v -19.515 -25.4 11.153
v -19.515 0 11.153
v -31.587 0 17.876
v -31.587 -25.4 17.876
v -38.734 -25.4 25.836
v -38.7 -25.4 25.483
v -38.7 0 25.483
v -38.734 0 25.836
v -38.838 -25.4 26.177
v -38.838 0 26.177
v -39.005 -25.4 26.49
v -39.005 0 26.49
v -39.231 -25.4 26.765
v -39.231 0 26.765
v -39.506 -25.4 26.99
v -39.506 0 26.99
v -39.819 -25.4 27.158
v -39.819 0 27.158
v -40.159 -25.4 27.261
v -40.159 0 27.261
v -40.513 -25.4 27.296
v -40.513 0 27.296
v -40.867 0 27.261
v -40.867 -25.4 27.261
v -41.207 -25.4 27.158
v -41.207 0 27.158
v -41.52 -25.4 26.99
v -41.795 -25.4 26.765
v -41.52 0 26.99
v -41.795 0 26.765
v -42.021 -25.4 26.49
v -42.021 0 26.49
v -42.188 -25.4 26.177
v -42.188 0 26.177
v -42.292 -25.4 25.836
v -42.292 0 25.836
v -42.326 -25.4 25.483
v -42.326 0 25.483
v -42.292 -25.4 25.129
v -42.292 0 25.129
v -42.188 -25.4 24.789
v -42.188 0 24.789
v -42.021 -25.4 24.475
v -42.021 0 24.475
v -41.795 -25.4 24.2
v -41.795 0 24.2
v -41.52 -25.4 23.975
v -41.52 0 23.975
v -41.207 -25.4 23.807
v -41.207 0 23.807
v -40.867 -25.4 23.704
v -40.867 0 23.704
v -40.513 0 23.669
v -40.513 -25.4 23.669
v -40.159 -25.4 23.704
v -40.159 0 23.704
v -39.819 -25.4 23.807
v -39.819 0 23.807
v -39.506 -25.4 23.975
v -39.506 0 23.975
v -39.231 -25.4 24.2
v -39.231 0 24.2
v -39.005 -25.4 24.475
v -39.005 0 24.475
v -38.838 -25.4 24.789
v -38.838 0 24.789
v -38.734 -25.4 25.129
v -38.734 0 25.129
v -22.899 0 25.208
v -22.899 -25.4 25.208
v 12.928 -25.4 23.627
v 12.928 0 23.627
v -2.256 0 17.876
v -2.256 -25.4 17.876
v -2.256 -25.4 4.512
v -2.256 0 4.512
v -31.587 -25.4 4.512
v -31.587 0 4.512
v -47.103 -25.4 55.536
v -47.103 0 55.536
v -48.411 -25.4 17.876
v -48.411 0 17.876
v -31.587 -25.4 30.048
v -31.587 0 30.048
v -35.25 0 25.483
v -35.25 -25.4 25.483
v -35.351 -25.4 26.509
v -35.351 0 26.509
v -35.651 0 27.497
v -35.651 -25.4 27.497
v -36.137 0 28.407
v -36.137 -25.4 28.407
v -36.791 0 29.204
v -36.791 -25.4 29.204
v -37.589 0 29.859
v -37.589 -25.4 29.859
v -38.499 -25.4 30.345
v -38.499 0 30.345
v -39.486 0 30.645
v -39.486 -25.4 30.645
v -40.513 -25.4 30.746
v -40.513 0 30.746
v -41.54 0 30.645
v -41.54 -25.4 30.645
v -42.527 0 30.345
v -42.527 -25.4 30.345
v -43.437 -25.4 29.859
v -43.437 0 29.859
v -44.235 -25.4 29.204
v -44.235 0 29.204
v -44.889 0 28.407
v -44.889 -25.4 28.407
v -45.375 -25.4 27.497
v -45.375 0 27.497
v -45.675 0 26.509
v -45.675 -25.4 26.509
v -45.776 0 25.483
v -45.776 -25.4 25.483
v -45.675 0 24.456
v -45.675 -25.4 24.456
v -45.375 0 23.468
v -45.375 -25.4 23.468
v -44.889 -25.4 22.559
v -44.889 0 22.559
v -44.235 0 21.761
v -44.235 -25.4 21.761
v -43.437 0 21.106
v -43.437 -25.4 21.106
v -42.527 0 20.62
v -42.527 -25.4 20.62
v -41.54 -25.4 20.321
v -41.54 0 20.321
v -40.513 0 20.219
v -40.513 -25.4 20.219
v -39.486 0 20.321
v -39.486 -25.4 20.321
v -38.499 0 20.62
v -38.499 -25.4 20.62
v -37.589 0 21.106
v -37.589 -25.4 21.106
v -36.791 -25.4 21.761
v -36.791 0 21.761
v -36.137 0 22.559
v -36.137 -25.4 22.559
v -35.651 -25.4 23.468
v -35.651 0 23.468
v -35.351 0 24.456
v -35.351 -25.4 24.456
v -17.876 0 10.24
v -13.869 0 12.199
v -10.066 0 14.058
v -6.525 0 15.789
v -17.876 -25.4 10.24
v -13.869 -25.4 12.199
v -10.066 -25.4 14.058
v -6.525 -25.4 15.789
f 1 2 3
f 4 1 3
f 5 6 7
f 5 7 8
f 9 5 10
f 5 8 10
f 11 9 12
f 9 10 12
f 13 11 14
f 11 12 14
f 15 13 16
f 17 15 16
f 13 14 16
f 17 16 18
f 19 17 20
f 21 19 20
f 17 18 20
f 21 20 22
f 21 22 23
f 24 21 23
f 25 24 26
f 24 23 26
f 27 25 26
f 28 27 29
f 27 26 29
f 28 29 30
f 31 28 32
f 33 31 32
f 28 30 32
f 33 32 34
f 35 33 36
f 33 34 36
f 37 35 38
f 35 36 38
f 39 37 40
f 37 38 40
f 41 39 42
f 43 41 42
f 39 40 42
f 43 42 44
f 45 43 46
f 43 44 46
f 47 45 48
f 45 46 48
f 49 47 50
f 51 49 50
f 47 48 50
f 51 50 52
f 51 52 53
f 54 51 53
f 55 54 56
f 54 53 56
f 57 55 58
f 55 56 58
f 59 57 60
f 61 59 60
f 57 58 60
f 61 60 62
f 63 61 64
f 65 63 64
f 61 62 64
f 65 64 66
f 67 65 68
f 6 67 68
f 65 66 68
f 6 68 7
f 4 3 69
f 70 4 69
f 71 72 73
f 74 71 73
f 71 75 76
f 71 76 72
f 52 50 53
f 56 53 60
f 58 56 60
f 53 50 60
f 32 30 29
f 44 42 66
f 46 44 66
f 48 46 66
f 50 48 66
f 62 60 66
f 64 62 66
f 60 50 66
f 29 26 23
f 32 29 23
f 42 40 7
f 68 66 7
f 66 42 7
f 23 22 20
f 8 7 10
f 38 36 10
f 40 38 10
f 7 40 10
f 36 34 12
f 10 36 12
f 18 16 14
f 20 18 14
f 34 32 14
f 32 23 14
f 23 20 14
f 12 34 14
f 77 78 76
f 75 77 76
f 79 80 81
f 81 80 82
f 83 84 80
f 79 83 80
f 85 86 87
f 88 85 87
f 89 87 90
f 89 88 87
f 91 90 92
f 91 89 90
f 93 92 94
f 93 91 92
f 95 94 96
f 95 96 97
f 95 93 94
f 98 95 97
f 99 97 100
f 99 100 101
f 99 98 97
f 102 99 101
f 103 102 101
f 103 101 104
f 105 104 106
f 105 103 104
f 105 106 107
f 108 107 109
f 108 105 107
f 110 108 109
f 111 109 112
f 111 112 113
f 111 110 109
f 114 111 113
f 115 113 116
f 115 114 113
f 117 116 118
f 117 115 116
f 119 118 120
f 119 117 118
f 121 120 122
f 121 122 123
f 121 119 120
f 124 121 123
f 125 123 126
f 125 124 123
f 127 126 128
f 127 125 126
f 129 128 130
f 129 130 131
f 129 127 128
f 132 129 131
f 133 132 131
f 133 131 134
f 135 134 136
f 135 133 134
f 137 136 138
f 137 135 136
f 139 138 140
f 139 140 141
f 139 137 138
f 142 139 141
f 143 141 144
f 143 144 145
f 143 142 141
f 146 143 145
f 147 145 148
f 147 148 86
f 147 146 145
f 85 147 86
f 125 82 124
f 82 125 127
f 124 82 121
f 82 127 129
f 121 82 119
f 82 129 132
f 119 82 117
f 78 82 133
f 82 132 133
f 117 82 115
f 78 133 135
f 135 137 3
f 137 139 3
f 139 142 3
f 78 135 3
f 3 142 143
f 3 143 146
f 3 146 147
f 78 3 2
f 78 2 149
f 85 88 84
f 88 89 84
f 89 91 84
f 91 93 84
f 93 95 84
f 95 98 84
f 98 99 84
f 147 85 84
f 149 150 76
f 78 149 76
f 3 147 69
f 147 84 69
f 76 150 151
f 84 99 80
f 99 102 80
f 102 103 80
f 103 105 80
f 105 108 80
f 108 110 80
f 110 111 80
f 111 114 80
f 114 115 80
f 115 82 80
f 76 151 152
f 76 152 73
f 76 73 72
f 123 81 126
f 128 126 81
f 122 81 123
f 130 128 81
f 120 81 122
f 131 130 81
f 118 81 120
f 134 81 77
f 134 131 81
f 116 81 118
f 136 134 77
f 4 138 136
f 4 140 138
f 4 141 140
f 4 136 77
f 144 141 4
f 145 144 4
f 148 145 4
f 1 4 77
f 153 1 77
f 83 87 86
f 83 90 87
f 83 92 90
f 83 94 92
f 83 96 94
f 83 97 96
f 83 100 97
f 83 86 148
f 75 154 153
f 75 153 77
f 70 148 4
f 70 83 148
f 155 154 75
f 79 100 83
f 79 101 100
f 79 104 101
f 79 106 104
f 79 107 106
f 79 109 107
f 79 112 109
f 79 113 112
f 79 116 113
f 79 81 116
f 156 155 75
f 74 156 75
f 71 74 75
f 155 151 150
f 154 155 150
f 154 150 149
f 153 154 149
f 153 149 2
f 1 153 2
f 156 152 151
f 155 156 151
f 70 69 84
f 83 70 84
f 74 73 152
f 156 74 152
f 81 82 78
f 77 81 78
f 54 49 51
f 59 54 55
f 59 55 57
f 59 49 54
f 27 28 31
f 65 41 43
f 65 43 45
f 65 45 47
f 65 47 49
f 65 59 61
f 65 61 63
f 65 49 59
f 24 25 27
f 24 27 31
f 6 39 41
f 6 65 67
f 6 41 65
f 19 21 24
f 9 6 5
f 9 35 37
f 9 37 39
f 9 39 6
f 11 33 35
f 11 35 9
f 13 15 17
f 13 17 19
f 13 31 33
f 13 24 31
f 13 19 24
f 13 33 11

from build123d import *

# Parameters (mm, degrees)
F0_R     = 5.263084
F0_R_2   = 1.813399
F1_DEPTH = 25.4


with BuildPart() as f1:
    # F0 (on Front) → F1 (new body)
    with BuildSketch(Plane.XZ):
        Polygon((-48.41087, 17.87642), (-31.587463, 4.512495), (-2.256247, 4.512495), (12.927662, 23.62702), (-2.256247, 17.87642), (-6.525034, 15.789458), (-10.066333, 14.058156), (-13.868975, 12.199087), (-17.87642, 10.239892), (-19.51499, 11.152513), (-31.587463, 17.87642), (-22.898601, 25.208317), (-31.587463, 30.047682), (-47.103249, 55.536054), align=None)
        with Locations((-40.512998, 25.482573)):
            Circle(F0_R, mode=Mode.SUBTRACT)
        with Locations((-40.512998, 25.482573)):
            Circle(F0_R_2)
    extrude(amount=F1_DEPTH)


solid = f1.part
